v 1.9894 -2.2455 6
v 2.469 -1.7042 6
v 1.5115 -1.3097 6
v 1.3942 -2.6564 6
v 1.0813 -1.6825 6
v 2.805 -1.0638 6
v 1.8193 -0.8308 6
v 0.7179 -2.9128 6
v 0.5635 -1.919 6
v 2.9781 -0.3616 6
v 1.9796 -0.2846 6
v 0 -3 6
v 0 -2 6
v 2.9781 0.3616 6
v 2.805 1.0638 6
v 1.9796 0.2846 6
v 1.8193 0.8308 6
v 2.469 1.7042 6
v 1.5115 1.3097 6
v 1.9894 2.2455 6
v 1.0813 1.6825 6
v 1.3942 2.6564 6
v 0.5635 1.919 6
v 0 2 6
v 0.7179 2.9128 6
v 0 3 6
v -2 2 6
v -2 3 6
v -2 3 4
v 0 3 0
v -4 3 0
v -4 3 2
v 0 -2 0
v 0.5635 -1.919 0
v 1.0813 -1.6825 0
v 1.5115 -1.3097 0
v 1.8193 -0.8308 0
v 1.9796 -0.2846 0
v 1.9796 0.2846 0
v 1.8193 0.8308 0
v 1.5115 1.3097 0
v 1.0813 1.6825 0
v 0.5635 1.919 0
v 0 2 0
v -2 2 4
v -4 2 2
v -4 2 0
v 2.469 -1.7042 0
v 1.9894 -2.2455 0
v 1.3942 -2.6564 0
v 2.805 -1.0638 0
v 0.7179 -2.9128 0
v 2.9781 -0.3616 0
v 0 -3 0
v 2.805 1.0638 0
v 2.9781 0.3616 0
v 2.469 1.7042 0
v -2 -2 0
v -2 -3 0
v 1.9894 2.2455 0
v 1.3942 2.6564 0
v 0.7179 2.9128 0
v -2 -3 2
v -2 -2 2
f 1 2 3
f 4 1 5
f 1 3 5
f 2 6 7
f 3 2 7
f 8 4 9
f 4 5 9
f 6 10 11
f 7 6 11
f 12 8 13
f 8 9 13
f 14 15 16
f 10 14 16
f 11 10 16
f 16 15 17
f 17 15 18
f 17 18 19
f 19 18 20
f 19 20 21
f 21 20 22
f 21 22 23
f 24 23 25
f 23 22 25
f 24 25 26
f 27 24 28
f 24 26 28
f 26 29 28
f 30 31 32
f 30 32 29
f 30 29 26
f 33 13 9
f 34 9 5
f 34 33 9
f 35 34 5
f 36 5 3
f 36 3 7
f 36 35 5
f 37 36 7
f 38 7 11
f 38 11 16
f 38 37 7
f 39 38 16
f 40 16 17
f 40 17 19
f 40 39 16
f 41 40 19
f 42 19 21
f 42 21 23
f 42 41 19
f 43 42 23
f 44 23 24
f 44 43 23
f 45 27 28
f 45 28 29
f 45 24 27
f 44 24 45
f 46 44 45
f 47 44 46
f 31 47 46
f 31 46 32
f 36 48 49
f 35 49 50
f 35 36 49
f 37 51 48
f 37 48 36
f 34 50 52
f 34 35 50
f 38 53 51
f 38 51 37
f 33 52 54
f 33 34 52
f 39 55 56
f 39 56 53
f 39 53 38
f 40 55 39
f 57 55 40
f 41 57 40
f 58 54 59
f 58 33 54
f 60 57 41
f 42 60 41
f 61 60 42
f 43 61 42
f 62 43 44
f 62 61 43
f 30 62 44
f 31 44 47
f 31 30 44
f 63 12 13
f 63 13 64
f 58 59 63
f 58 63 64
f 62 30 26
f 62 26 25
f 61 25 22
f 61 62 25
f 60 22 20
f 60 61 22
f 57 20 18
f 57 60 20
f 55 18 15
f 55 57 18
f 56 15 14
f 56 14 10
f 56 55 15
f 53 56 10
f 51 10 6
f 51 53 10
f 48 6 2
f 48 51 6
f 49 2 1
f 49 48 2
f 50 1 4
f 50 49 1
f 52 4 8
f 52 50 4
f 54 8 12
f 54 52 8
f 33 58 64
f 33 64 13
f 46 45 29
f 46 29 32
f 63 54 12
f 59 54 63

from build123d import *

# Parameters (mm, degrees)
BOSS_EXTRUDE1_DEPTH = 6
CUT_EXTRUDE1_DEPTH  = 6
CUT_EXTRUDE2_DEPTH  = 1


with BuildPart() as part:
    # Sketch2 → Boss-Extrude1 (new body)
    with BuildSketch(Plane.XY):
        with BuildLine():
            Line((0, 2), (-4, 2))
            Line((-4, 2), (-4, 3))
            Line((-4, 3), (0, 3))
            ThreePointArc((0, 3), (3, 0), (0, -3))
            Line((0, -3), (-2, -3))
            Line((-2, -3), (-2, -2))
            Line((-2, -2), (0, -2))
            ThreePointArc((0, -2), (2, 0), (0, 2))
        make_face()
    extrude(amount=BOSS_EXTRUDE1_DEPTH)

    # Sketch3 → Cut-Extrude1 (cut)
    with BuildSketch(Plane.XZ.offset(-2)):
        Polygon((-2, 6), (-2, 4), (-4, 2), (-4, 6), align=None)
    extrude(amount=-CUT_EXTRUDE1_DEPTH, mode=Mode.SUBTRACT)

    # Sketch4 → Cut-Extrude2 (cut)
    with BuildSketch(Plane.XZ.offset(3)):
        Polygon((0, 6), (-2, 2), (-2, 6), align=None)
    extrude(amount=-CUT_EXTRUDE2_DEPTH, mode=Mode.SUBTRACT)


solid = part.part
